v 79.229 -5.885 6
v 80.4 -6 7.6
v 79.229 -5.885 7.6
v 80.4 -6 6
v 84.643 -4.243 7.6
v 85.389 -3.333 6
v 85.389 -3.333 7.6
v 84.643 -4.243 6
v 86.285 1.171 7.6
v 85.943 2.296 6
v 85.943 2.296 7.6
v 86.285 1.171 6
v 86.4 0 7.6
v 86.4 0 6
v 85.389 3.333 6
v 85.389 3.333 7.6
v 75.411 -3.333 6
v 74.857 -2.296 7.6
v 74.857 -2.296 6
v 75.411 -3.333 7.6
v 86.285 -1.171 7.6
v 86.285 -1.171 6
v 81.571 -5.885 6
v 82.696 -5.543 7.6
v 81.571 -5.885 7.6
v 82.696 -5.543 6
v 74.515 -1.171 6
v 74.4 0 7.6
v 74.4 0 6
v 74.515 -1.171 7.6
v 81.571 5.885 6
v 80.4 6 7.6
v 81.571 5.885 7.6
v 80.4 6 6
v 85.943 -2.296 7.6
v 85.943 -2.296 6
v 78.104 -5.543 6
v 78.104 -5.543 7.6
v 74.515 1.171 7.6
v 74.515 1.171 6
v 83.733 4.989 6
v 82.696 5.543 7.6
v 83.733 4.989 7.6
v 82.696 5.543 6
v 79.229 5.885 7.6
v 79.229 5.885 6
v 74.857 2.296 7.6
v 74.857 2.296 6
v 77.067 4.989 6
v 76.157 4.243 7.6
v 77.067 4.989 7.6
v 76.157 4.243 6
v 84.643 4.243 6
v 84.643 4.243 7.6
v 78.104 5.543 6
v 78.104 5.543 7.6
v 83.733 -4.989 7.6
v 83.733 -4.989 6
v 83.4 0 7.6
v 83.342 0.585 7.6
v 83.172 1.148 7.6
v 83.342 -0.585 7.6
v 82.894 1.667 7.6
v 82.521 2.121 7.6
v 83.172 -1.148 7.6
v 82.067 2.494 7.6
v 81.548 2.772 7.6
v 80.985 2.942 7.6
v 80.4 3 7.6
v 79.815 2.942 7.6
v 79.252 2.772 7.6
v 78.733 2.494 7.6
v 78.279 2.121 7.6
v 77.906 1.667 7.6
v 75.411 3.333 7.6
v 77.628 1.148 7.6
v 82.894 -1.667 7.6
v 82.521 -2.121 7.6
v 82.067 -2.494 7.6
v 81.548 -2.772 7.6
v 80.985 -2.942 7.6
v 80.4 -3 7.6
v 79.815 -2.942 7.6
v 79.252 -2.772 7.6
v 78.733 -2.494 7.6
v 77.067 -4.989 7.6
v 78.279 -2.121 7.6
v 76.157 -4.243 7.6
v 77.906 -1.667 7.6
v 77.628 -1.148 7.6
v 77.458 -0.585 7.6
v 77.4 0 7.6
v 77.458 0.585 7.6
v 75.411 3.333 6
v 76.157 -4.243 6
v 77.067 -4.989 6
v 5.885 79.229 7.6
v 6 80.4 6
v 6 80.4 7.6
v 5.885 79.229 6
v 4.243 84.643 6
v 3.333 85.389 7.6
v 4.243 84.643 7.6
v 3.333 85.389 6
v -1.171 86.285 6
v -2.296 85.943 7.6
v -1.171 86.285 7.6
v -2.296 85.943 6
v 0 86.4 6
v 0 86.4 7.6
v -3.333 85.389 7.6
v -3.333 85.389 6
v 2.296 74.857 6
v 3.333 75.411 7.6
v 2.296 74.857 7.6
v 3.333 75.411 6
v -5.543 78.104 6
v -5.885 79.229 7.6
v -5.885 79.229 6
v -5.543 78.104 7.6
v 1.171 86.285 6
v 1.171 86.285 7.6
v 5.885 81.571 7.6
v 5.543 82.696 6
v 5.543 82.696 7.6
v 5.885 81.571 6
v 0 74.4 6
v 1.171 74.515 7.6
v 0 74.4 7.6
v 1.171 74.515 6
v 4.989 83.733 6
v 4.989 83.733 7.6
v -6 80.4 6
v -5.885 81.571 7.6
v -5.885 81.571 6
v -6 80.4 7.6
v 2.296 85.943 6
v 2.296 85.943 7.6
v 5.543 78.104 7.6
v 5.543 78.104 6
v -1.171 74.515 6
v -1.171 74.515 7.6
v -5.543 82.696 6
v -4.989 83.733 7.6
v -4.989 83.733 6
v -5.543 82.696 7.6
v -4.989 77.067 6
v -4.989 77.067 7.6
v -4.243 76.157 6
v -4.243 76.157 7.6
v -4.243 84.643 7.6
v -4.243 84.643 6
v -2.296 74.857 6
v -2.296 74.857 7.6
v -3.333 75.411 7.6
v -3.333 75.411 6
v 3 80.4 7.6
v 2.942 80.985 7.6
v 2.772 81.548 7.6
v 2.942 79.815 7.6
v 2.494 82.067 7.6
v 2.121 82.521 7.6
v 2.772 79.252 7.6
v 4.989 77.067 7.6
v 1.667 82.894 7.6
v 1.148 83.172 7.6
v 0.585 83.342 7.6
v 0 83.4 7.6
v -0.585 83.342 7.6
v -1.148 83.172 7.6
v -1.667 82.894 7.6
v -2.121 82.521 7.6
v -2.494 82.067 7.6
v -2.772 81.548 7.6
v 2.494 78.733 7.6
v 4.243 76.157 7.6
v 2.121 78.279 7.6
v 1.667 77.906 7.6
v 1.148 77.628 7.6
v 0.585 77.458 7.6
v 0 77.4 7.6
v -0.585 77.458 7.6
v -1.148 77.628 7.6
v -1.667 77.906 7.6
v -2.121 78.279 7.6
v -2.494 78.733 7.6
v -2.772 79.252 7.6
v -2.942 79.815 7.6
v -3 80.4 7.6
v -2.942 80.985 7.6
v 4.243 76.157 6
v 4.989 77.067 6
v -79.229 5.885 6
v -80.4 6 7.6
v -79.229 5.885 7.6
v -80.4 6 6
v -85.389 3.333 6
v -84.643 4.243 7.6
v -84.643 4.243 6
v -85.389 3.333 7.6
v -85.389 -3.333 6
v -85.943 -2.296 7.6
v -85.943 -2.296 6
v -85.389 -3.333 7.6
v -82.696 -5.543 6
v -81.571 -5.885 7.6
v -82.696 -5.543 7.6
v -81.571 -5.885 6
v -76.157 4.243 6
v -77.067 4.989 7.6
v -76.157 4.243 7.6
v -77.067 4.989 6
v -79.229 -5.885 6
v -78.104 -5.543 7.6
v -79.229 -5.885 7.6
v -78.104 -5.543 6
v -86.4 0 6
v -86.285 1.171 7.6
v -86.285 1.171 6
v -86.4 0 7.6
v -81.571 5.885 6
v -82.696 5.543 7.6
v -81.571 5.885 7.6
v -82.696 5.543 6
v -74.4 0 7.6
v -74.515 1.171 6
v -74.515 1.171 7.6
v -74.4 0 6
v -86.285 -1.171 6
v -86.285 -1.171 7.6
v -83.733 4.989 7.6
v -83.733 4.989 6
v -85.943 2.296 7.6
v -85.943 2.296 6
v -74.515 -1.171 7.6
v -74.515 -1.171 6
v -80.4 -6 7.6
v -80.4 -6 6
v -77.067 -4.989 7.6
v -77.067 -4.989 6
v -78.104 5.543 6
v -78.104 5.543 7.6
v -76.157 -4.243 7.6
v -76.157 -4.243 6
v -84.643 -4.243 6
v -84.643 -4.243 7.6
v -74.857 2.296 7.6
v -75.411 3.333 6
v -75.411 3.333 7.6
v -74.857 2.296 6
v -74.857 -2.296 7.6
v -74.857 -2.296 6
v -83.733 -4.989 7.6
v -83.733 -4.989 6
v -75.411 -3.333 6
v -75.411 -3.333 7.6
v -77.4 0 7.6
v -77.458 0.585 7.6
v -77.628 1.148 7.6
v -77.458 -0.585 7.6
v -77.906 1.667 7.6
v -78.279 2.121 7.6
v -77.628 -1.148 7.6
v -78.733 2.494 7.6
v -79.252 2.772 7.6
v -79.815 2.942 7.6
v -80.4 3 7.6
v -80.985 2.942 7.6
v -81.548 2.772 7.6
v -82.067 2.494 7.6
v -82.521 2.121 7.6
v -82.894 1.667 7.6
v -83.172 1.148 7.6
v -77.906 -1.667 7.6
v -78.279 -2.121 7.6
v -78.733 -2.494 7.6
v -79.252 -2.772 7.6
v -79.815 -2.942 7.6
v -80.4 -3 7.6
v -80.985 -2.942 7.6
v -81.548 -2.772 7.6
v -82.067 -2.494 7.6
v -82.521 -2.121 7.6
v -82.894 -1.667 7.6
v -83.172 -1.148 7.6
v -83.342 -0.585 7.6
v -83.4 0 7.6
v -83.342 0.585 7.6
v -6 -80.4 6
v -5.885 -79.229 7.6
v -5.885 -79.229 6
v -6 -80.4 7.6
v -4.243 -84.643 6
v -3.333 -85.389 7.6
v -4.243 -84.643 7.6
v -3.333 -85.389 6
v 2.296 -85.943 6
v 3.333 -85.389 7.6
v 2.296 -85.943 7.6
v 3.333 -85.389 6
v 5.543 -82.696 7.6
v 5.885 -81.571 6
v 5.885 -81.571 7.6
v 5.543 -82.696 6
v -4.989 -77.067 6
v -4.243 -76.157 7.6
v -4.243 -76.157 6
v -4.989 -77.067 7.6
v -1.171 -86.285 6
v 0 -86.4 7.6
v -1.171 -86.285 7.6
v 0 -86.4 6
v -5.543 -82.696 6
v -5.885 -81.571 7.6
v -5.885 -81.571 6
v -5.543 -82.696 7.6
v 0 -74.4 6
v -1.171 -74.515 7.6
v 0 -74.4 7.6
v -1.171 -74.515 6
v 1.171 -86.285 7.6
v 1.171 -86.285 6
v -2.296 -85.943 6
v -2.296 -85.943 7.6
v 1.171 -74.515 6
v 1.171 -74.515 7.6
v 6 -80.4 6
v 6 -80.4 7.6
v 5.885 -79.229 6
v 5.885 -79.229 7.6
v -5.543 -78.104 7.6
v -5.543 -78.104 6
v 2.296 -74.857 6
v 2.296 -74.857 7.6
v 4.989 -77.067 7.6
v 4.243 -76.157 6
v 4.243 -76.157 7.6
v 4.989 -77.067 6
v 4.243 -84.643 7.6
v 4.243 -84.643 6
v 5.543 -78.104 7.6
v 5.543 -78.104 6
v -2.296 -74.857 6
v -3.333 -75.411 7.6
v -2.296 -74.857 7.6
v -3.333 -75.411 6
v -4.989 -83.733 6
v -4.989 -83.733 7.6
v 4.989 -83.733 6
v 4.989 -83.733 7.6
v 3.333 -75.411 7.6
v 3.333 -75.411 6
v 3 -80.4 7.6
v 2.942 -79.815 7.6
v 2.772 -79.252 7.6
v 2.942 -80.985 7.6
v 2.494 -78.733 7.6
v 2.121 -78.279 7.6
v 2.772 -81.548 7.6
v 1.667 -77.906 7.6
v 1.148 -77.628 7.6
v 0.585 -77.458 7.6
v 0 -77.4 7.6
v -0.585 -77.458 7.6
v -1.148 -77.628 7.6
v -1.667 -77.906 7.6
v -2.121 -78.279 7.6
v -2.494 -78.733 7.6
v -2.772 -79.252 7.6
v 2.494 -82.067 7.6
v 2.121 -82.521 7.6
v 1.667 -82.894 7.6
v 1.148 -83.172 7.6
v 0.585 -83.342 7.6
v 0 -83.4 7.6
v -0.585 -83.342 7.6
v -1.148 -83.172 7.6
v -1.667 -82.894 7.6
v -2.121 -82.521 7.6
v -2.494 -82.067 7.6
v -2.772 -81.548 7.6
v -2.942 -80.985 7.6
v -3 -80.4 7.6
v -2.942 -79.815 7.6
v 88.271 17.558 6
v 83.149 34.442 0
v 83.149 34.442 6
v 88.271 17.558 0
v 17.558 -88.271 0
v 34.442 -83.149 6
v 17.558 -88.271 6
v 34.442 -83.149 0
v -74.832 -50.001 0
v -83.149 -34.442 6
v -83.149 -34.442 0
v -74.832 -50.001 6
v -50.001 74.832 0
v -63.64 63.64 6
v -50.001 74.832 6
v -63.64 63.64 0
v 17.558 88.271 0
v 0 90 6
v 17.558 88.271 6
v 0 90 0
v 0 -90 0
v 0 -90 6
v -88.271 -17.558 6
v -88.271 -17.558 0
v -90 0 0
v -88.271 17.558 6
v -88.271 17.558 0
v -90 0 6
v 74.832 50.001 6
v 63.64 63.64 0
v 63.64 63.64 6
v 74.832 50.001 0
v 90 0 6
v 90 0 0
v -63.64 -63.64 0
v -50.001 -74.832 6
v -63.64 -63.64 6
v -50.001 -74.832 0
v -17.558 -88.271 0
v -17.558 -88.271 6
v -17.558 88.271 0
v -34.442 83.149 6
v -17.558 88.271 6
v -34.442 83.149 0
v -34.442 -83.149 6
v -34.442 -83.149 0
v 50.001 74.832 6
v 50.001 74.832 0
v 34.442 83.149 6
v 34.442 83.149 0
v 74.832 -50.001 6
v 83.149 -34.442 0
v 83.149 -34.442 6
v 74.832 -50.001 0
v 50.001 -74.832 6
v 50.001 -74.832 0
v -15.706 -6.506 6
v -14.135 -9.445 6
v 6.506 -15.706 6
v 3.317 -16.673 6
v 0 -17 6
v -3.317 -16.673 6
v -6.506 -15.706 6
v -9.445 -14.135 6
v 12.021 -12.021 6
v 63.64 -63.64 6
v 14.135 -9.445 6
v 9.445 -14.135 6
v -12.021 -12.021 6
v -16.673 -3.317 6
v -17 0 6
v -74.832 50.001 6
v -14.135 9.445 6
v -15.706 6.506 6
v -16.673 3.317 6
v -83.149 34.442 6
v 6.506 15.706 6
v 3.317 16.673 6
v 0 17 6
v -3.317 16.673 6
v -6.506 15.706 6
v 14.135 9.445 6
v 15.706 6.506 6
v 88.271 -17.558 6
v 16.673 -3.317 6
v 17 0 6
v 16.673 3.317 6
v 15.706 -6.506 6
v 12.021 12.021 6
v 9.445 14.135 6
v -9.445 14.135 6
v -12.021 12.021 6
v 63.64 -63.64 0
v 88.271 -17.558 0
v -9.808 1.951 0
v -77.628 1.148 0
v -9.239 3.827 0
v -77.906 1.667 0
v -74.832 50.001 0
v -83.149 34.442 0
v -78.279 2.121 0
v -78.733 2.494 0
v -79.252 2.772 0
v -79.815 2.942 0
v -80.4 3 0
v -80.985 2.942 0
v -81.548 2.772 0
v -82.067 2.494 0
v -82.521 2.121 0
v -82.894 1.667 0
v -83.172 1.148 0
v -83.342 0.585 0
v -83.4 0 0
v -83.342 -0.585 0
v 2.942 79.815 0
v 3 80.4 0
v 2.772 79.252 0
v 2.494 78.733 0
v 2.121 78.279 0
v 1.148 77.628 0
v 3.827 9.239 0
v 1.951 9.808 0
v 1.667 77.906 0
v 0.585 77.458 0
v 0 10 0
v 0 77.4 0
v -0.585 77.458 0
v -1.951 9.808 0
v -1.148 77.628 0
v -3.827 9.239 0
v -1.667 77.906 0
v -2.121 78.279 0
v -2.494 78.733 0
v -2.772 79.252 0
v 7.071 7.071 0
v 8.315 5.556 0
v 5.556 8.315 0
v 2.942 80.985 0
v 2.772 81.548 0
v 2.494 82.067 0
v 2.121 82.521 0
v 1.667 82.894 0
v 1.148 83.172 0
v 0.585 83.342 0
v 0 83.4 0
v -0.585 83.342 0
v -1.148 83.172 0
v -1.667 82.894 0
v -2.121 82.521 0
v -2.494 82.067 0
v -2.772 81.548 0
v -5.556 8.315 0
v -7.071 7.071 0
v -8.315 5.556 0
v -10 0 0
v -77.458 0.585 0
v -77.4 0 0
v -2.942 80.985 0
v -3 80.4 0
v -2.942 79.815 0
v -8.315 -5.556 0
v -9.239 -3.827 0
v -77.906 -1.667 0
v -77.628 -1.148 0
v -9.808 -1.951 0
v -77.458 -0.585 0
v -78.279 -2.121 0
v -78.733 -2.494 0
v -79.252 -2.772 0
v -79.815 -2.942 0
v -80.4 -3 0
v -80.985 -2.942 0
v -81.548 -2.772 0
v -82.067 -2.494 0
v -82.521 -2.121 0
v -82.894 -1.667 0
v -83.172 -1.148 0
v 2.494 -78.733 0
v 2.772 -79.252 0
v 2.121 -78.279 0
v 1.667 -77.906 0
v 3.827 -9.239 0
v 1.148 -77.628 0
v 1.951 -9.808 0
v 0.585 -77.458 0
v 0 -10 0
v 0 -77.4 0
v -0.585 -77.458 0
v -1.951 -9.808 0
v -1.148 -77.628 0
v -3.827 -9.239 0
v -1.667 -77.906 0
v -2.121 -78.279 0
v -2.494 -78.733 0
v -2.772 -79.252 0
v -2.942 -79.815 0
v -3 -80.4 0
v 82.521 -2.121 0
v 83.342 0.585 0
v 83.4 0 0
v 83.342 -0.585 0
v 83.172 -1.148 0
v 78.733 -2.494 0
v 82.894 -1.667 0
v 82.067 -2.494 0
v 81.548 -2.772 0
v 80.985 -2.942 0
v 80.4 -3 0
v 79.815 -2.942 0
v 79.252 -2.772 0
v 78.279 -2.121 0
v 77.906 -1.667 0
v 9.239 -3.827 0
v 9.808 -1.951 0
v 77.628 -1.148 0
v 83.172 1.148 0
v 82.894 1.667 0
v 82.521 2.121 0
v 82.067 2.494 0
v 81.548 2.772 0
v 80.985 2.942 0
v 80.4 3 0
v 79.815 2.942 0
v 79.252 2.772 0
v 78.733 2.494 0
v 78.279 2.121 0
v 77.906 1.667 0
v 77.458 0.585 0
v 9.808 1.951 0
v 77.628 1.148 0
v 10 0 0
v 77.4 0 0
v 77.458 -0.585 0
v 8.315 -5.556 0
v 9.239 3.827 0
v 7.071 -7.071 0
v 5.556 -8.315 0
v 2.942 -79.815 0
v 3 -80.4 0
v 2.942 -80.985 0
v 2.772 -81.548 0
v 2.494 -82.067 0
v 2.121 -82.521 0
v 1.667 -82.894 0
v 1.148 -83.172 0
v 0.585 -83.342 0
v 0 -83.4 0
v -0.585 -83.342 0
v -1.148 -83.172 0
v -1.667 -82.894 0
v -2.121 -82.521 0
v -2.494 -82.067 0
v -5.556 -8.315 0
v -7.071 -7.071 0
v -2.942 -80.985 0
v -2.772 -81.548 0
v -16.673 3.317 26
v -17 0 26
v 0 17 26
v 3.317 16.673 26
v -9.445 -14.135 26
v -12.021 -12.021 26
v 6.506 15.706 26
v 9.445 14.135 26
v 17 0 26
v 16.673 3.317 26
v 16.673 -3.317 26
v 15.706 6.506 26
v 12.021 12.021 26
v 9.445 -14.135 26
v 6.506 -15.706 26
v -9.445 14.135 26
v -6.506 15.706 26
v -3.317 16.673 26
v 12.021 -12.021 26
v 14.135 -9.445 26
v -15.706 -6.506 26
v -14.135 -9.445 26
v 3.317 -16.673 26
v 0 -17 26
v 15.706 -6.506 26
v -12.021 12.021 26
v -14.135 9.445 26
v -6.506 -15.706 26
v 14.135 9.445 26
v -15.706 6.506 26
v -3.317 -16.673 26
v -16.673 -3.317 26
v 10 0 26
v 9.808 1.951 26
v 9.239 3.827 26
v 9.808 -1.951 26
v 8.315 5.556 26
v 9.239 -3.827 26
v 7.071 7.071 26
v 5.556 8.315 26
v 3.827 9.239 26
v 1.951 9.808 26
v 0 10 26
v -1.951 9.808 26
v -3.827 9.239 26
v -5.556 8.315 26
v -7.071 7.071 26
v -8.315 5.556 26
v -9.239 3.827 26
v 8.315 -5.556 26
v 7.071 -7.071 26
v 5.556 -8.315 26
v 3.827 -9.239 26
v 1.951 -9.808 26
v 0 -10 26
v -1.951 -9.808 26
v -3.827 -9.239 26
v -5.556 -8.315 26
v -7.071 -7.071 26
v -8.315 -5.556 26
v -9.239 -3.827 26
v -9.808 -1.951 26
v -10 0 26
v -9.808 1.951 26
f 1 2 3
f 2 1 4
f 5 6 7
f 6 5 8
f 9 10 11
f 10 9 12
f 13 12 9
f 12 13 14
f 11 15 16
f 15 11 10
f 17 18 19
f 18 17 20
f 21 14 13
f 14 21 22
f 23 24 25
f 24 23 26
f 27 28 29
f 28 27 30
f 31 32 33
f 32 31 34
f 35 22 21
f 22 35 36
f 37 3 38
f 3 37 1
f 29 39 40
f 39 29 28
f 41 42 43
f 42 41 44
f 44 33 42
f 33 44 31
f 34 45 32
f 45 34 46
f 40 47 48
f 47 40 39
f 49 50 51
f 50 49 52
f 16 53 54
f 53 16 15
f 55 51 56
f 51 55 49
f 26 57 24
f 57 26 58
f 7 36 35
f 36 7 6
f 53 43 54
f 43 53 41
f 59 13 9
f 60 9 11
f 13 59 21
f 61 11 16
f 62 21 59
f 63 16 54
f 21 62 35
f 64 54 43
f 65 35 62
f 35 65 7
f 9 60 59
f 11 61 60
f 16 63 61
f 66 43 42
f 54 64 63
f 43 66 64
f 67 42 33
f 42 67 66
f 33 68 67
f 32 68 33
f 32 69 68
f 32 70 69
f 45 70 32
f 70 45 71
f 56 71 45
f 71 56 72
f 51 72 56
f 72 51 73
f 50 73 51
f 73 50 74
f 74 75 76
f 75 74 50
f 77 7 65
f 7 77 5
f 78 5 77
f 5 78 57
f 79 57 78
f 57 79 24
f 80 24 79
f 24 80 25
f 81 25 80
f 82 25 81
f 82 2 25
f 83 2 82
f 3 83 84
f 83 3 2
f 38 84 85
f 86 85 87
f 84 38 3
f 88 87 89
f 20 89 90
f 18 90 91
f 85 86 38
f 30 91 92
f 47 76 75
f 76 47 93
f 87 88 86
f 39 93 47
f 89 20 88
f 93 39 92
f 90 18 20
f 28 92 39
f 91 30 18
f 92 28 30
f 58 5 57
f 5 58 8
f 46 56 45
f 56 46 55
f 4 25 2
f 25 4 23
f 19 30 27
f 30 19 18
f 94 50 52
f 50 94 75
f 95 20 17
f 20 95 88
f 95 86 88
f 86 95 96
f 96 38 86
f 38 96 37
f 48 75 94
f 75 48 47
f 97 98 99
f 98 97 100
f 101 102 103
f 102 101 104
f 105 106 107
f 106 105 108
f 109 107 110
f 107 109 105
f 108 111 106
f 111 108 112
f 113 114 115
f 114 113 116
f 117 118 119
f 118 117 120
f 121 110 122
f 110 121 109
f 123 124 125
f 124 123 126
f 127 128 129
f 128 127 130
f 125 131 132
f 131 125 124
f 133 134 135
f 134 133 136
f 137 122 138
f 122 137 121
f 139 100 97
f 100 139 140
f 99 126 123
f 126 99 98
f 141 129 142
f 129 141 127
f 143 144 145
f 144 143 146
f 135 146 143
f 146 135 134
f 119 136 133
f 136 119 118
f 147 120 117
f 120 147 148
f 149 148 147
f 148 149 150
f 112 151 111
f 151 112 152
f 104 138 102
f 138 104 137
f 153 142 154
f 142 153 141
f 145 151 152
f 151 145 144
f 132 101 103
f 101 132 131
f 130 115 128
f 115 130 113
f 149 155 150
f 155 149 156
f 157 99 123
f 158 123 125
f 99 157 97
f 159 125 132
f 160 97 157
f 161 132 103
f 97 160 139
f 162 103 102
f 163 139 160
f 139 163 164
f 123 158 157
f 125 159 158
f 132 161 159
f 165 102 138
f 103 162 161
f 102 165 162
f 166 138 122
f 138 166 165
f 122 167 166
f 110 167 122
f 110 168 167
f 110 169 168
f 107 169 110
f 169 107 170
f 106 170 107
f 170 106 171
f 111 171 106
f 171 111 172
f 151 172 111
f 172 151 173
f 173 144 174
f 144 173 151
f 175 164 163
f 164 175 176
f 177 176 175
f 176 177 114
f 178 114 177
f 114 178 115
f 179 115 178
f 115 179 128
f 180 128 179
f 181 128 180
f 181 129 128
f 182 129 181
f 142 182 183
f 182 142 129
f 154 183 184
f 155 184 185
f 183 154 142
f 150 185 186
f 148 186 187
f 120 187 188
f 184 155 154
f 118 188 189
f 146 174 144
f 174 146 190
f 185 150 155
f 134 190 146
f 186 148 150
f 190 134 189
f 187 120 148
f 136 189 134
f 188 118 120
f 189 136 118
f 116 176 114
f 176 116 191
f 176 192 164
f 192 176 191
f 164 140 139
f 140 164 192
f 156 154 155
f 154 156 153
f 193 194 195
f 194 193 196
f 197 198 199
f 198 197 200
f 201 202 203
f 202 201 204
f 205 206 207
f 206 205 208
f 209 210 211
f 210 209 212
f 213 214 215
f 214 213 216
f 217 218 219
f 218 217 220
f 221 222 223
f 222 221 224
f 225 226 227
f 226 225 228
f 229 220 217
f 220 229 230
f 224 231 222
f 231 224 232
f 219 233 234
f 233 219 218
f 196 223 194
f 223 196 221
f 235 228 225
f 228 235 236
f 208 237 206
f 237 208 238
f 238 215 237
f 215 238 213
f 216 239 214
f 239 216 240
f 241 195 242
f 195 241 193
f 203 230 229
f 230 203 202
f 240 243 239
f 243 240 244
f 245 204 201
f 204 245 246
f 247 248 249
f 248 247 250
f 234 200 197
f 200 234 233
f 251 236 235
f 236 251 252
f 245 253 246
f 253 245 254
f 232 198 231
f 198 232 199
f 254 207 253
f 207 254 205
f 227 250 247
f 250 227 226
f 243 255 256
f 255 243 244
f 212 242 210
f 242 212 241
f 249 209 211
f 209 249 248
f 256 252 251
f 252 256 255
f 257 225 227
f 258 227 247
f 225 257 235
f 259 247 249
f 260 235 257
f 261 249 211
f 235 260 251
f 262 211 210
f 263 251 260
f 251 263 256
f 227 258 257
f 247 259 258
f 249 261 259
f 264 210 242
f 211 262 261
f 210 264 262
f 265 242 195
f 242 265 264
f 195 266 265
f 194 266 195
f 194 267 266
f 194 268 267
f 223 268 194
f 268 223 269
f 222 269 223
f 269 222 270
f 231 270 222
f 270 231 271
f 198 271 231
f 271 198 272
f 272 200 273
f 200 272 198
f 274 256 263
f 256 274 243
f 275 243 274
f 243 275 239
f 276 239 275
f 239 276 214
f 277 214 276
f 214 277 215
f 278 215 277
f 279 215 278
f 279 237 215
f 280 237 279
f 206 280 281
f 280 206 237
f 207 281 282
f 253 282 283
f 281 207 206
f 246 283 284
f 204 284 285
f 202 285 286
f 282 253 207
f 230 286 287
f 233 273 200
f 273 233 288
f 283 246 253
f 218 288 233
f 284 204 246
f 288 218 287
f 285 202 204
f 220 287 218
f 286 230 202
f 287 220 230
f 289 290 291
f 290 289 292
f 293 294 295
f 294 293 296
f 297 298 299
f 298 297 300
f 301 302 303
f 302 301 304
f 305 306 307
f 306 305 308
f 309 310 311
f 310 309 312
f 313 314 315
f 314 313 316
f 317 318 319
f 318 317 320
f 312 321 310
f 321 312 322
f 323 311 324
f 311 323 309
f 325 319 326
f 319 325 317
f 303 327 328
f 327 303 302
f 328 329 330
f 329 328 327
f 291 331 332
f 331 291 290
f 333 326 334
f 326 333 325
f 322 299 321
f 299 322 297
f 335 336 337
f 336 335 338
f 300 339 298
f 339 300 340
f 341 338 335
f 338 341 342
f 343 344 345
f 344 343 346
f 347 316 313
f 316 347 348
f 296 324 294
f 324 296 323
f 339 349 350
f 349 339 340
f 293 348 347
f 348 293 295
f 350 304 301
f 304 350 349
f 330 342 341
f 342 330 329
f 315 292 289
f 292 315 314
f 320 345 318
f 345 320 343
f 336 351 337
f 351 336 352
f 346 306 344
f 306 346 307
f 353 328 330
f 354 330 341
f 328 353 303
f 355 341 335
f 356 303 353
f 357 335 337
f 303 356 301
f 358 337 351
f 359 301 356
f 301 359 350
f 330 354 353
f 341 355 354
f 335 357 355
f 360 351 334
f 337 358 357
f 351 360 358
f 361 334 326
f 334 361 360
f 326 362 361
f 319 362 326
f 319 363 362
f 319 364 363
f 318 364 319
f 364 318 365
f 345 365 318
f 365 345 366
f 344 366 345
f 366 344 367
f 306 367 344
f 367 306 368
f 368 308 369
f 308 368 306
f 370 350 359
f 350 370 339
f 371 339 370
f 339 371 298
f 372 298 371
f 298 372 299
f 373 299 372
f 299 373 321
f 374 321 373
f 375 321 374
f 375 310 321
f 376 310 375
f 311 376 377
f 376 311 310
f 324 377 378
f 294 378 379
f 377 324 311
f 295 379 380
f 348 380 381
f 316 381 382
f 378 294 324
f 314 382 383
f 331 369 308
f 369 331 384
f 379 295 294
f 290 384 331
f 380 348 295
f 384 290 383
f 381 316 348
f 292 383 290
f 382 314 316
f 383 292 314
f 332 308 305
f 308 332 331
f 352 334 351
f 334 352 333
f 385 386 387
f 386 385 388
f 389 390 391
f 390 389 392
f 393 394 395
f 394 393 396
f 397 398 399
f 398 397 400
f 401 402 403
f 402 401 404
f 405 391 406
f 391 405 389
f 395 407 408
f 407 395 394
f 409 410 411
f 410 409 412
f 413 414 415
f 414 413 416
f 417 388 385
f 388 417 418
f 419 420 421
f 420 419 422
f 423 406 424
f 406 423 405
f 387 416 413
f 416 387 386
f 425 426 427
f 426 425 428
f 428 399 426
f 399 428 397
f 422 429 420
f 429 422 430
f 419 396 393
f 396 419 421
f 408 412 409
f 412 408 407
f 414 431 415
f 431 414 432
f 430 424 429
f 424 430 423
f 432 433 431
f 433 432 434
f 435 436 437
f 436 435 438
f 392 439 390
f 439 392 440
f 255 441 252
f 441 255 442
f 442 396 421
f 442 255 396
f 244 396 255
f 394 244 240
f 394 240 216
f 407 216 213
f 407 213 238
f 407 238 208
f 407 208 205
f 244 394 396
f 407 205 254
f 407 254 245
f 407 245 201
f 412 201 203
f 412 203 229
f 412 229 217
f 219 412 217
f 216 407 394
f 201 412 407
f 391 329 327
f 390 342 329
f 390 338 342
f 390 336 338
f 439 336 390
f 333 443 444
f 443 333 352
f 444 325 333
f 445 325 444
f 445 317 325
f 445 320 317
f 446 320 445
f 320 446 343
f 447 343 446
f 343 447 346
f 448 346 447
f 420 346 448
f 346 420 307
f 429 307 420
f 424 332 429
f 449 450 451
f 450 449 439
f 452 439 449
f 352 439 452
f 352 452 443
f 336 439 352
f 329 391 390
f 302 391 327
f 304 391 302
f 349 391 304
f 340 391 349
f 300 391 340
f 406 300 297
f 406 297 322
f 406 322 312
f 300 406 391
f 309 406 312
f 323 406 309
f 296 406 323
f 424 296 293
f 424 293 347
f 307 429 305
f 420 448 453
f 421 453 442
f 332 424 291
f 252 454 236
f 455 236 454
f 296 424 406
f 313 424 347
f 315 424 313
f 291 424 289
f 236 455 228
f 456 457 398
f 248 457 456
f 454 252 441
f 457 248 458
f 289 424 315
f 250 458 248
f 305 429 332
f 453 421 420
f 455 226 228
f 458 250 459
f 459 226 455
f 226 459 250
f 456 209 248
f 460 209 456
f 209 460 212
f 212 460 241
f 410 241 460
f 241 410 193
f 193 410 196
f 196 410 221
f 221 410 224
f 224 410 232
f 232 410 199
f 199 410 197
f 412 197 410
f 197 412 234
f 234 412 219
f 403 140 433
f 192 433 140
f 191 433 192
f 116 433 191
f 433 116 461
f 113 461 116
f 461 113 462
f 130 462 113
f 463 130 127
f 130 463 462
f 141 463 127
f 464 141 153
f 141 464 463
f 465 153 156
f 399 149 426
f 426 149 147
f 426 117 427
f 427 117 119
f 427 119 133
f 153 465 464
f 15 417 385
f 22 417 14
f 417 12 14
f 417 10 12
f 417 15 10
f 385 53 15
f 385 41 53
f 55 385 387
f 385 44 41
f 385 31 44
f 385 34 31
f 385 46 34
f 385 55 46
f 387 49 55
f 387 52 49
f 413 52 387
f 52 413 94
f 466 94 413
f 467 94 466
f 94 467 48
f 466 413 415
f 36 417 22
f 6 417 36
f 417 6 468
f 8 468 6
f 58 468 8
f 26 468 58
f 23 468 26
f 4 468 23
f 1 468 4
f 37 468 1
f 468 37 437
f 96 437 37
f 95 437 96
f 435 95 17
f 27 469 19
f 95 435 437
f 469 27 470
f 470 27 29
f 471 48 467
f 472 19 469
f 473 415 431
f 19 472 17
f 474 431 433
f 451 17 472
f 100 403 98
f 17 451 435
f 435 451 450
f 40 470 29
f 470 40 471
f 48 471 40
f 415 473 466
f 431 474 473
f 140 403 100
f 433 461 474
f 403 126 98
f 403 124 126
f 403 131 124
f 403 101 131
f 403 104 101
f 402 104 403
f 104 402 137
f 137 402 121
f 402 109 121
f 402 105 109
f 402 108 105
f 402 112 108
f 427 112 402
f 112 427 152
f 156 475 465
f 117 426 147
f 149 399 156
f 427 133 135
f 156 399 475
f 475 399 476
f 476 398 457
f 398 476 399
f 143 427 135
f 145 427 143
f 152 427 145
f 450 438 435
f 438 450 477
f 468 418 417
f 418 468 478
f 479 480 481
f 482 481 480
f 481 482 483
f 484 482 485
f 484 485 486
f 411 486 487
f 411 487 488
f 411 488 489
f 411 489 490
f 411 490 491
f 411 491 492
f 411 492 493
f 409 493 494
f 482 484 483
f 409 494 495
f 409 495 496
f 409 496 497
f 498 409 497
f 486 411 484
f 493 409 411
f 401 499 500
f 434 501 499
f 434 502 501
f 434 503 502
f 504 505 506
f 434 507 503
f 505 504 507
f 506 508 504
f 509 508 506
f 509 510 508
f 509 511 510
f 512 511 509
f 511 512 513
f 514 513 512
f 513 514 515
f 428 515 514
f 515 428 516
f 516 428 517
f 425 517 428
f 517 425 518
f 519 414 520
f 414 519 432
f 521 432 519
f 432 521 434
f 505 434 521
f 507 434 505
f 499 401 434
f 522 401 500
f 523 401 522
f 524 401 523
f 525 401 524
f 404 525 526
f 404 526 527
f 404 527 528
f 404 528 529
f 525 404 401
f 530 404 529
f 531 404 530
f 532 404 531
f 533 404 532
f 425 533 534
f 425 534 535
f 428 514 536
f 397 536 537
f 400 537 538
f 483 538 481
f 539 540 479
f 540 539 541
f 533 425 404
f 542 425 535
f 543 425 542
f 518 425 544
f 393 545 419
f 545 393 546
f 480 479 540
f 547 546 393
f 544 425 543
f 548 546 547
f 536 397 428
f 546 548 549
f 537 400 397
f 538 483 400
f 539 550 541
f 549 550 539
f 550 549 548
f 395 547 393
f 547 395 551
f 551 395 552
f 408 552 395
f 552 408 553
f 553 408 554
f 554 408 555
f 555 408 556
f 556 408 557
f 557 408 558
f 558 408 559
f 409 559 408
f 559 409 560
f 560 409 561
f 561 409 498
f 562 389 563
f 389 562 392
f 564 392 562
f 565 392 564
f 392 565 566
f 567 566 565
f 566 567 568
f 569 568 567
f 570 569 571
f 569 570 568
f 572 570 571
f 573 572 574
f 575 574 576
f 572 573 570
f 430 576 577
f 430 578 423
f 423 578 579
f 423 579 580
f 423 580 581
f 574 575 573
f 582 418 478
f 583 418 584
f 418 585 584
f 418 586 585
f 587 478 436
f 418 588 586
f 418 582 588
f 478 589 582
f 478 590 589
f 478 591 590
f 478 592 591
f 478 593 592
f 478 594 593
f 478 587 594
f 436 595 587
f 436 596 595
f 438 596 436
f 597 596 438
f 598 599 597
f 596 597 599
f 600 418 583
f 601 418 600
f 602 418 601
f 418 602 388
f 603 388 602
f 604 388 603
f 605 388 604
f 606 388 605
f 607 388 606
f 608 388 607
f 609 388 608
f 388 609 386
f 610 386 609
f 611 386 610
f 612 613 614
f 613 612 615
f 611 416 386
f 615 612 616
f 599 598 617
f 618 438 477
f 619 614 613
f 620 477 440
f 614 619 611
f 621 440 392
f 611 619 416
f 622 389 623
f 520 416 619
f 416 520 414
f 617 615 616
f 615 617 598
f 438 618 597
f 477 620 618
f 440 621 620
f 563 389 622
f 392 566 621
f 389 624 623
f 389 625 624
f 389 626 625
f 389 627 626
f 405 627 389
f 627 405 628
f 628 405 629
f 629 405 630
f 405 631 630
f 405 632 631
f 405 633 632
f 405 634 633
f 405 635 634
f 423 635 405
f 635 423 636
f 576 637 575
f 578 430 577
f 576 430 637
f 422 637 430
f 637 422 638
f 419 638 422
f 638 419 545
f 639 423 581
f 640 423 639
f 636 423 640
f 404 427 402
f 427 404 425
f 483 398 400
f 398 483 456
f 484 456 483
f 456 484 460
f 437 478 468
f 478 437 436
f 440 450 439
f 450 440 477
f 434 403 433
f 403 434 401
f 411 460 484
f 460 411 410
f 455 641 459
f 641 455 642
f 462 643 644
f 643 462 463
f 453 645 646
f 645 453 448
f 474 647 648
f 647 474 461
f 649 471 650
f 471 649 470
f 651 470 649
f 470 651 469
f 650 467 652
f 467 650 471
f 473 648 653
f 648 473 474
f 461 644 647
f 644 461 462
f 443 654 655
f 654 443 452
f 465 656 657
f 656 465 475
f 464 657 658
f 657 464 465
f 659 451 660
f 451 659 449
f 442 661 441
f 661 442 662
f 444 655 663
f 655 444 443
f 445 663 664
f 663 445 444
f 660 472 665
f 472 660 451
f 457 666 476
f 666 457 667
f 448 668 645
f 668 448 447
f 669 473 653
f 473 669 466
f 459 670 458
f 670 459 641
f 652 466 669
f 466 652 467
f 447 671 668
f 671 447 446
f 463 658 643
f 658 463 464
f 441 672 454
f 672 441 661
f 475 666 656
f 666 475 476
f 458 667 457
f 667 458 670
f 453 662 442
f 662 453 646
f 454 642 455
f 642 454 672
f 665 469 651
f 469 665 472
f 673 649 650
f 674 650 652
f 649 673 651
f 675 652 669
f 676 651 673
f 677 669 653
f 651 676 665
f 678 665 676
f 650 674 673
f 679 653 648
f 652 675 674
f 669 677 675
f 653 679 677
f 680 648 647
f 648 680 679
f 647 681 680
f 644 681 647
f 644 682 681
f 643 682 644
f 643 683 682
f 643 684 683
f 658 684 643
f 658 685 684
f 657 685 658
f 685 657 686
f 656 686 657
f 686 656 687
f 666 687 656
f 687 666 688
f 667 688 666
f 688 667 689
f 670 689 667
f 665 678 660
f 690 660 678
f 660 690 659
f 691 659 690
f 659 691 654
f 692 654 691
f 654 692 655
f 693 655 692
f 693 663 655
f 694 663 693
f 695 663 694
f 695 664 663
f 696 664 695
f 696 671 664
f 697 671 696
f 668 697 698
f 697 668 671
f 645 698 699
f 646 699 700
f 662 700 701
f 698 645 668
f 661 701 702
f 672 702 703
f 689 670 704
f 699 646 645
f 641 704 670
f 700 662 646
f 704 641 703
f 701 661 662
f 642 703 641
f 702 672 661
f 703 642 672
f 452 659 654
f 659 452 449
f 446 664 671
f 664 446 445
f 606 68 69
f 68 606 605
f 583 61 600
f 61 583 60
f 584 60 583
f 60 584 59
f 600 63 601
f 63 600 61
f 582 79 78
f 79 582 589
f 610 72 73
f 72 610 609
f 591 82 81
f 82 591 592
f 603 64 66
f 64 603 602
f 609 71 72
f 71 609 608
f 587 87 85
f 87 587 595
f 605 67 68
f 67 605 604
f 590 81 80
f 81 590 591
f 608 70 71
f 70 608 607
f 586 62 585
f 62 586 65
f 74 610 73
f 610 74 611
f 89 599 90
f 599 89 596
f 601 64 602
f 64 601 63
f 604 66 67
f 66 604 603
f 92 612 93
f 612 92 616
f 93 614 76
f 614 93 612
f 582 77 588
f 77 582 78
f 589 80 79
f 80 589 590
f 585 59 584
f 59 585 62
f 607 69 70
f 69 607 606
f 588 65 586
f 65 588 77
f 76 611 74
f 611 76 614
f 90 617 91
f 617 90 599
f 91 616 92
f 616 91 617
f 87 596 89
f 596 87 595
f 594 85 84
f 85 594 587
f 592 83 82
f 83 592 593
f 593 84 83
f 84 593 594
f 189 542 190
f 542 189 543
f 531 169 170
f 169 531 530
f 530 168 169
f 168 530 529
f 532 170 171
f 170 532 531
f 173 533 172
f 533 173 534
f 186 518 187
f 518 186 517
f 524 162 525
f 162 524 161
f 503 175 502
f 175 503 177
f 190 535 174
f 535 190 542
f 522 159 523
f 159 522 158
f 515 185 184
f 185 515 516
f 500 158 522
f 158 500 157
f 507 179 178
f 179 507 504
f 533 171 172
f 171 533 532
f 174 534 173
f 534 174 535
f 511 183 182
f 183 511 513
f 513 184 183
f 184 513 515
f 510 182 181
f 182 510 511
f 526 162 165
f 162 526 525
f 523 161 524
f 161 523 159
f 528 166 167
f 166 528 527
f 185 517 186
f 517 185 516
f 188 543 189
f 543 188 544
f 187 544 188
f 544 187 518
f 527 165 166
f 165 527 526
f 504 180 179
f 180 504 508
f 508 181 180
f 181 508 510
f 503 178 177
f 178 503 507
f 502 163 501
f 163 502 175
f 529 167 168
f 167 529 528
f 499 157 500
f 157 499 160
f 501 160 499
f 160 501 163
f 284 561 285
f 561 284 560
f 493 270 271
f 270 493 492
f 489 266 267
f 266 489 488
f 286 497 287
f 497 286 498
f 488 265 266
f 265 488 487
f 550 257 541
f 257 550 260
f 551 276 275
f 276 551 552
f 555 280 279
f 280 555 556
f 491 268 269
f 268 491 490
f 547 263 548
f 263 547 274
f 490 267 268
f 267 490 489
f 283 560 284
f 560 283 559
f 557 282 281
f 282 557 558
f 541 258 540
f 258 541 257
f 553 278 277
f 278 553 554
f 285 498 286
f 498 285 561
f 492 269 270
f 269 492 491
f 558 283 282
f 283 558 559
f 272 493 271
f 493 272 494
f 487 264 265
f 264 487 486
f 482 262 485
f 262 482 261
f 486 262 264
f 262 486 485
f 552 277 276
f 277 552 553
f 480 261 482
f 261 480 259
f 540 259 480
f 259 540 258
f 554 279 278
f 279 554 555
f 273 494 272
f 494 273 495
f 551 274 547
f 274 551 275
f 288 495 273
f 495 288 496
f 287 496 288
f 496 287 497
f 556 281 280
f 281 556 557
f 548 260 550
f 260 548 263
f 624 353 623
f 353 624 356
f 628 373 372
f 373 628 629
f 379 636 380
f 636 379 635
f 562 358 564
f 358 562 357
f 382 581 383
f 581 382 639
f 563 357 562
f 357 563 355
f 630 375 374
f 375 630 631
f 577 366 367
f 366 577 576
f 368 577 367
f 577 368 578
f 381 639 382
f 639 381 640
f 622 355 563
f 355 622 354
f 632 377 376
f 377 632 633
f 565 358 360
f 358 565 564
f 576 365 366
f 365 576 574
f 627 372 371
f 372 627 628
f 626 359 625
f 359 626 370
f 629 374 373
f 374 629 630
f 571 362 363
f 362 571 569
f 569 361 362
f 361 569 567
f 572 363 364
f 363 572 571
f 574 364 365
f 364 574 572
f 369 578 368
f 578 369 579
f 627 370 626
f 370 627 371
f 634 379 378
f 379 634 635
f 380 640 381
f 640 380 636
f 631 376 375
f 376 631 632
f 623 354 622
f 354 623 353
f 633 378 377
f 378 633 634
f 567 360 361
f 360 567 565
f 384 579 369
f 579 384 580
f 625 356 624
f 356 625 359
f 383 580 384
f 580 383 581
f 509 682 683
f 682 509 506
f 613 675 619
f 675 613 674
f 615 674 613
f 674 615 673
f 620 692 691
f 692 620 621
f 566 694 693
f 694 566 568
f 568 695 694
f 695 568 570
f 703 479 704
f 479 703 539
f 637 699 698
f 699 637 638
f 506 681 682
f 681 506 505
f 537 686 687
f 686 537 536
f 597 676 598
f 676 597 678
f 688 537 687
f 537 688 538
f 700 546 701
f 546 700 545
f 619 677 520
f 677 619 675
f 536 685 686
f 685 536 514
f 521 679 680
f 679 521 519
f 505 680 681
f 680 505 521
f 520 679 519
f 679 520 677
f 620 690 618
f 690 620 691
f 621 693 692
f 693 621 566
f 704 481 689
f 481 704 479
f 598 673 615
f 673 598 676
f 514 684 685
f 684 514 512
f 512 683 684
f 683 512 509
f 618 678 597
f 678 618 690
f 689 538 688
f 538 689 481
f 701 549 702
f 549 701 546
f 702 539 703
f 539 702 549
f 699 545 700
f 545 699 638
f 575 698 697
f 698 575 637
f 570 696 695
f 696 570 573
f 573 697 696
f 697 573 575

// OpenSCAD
$fn = 32;

// ----------------------------------------------------------------------
// Bolt-circle flange: 180 mm outside, 4 bolt holes, bore 20 mm
// ----------------------------------------------------------------------

// --- parameters (mm) ---
flange_d = 180;           // flange outside diameter
flange_t = 6;             // flange thickness
bolts = 4;                // number of bolt holes
bolt_d = 6;               // bolt clearance
bolt_r = 80.4;            // bolt circle radius
bore_d = 20;              // centre bore
hub_d = 34;               // raised hub diameter
hub_h = 20;               // raised hub height
spot_d = 12;              // spot faced bosses
spot_h = 1.6;             // spot face height

module body() {
  cylinder(h = flange_t, d = flange_d);
  /* raised hub, sunk 1 mm into the flange */
  translate([0, 0, flange_t - 1]) cylinder(h = hub_h + 1, d = hub_d);
  /* spot faced pads under the bolt heads */
  for (i = [0 : bolts - 1]) rotate([0, 0, i * 360 / bolts]) translate([bolt_r, 0, flange_t - 1]) cylinder(h = spot_h + 1, d = spot_d);
}

difference() {
  body();
  /* bolt circle */
  for (i = [0 : bolts - 1]) rotate([0, 0, i * 360 / bolts]) translate([bolt_r, 0, -1]) cylinder(h = flange_t + hub_h + 3, d = bolt_d);
  translate([0, 0, -1]) cylinder(h = flange_t + hub_h + 3, d = bore_d);
}
